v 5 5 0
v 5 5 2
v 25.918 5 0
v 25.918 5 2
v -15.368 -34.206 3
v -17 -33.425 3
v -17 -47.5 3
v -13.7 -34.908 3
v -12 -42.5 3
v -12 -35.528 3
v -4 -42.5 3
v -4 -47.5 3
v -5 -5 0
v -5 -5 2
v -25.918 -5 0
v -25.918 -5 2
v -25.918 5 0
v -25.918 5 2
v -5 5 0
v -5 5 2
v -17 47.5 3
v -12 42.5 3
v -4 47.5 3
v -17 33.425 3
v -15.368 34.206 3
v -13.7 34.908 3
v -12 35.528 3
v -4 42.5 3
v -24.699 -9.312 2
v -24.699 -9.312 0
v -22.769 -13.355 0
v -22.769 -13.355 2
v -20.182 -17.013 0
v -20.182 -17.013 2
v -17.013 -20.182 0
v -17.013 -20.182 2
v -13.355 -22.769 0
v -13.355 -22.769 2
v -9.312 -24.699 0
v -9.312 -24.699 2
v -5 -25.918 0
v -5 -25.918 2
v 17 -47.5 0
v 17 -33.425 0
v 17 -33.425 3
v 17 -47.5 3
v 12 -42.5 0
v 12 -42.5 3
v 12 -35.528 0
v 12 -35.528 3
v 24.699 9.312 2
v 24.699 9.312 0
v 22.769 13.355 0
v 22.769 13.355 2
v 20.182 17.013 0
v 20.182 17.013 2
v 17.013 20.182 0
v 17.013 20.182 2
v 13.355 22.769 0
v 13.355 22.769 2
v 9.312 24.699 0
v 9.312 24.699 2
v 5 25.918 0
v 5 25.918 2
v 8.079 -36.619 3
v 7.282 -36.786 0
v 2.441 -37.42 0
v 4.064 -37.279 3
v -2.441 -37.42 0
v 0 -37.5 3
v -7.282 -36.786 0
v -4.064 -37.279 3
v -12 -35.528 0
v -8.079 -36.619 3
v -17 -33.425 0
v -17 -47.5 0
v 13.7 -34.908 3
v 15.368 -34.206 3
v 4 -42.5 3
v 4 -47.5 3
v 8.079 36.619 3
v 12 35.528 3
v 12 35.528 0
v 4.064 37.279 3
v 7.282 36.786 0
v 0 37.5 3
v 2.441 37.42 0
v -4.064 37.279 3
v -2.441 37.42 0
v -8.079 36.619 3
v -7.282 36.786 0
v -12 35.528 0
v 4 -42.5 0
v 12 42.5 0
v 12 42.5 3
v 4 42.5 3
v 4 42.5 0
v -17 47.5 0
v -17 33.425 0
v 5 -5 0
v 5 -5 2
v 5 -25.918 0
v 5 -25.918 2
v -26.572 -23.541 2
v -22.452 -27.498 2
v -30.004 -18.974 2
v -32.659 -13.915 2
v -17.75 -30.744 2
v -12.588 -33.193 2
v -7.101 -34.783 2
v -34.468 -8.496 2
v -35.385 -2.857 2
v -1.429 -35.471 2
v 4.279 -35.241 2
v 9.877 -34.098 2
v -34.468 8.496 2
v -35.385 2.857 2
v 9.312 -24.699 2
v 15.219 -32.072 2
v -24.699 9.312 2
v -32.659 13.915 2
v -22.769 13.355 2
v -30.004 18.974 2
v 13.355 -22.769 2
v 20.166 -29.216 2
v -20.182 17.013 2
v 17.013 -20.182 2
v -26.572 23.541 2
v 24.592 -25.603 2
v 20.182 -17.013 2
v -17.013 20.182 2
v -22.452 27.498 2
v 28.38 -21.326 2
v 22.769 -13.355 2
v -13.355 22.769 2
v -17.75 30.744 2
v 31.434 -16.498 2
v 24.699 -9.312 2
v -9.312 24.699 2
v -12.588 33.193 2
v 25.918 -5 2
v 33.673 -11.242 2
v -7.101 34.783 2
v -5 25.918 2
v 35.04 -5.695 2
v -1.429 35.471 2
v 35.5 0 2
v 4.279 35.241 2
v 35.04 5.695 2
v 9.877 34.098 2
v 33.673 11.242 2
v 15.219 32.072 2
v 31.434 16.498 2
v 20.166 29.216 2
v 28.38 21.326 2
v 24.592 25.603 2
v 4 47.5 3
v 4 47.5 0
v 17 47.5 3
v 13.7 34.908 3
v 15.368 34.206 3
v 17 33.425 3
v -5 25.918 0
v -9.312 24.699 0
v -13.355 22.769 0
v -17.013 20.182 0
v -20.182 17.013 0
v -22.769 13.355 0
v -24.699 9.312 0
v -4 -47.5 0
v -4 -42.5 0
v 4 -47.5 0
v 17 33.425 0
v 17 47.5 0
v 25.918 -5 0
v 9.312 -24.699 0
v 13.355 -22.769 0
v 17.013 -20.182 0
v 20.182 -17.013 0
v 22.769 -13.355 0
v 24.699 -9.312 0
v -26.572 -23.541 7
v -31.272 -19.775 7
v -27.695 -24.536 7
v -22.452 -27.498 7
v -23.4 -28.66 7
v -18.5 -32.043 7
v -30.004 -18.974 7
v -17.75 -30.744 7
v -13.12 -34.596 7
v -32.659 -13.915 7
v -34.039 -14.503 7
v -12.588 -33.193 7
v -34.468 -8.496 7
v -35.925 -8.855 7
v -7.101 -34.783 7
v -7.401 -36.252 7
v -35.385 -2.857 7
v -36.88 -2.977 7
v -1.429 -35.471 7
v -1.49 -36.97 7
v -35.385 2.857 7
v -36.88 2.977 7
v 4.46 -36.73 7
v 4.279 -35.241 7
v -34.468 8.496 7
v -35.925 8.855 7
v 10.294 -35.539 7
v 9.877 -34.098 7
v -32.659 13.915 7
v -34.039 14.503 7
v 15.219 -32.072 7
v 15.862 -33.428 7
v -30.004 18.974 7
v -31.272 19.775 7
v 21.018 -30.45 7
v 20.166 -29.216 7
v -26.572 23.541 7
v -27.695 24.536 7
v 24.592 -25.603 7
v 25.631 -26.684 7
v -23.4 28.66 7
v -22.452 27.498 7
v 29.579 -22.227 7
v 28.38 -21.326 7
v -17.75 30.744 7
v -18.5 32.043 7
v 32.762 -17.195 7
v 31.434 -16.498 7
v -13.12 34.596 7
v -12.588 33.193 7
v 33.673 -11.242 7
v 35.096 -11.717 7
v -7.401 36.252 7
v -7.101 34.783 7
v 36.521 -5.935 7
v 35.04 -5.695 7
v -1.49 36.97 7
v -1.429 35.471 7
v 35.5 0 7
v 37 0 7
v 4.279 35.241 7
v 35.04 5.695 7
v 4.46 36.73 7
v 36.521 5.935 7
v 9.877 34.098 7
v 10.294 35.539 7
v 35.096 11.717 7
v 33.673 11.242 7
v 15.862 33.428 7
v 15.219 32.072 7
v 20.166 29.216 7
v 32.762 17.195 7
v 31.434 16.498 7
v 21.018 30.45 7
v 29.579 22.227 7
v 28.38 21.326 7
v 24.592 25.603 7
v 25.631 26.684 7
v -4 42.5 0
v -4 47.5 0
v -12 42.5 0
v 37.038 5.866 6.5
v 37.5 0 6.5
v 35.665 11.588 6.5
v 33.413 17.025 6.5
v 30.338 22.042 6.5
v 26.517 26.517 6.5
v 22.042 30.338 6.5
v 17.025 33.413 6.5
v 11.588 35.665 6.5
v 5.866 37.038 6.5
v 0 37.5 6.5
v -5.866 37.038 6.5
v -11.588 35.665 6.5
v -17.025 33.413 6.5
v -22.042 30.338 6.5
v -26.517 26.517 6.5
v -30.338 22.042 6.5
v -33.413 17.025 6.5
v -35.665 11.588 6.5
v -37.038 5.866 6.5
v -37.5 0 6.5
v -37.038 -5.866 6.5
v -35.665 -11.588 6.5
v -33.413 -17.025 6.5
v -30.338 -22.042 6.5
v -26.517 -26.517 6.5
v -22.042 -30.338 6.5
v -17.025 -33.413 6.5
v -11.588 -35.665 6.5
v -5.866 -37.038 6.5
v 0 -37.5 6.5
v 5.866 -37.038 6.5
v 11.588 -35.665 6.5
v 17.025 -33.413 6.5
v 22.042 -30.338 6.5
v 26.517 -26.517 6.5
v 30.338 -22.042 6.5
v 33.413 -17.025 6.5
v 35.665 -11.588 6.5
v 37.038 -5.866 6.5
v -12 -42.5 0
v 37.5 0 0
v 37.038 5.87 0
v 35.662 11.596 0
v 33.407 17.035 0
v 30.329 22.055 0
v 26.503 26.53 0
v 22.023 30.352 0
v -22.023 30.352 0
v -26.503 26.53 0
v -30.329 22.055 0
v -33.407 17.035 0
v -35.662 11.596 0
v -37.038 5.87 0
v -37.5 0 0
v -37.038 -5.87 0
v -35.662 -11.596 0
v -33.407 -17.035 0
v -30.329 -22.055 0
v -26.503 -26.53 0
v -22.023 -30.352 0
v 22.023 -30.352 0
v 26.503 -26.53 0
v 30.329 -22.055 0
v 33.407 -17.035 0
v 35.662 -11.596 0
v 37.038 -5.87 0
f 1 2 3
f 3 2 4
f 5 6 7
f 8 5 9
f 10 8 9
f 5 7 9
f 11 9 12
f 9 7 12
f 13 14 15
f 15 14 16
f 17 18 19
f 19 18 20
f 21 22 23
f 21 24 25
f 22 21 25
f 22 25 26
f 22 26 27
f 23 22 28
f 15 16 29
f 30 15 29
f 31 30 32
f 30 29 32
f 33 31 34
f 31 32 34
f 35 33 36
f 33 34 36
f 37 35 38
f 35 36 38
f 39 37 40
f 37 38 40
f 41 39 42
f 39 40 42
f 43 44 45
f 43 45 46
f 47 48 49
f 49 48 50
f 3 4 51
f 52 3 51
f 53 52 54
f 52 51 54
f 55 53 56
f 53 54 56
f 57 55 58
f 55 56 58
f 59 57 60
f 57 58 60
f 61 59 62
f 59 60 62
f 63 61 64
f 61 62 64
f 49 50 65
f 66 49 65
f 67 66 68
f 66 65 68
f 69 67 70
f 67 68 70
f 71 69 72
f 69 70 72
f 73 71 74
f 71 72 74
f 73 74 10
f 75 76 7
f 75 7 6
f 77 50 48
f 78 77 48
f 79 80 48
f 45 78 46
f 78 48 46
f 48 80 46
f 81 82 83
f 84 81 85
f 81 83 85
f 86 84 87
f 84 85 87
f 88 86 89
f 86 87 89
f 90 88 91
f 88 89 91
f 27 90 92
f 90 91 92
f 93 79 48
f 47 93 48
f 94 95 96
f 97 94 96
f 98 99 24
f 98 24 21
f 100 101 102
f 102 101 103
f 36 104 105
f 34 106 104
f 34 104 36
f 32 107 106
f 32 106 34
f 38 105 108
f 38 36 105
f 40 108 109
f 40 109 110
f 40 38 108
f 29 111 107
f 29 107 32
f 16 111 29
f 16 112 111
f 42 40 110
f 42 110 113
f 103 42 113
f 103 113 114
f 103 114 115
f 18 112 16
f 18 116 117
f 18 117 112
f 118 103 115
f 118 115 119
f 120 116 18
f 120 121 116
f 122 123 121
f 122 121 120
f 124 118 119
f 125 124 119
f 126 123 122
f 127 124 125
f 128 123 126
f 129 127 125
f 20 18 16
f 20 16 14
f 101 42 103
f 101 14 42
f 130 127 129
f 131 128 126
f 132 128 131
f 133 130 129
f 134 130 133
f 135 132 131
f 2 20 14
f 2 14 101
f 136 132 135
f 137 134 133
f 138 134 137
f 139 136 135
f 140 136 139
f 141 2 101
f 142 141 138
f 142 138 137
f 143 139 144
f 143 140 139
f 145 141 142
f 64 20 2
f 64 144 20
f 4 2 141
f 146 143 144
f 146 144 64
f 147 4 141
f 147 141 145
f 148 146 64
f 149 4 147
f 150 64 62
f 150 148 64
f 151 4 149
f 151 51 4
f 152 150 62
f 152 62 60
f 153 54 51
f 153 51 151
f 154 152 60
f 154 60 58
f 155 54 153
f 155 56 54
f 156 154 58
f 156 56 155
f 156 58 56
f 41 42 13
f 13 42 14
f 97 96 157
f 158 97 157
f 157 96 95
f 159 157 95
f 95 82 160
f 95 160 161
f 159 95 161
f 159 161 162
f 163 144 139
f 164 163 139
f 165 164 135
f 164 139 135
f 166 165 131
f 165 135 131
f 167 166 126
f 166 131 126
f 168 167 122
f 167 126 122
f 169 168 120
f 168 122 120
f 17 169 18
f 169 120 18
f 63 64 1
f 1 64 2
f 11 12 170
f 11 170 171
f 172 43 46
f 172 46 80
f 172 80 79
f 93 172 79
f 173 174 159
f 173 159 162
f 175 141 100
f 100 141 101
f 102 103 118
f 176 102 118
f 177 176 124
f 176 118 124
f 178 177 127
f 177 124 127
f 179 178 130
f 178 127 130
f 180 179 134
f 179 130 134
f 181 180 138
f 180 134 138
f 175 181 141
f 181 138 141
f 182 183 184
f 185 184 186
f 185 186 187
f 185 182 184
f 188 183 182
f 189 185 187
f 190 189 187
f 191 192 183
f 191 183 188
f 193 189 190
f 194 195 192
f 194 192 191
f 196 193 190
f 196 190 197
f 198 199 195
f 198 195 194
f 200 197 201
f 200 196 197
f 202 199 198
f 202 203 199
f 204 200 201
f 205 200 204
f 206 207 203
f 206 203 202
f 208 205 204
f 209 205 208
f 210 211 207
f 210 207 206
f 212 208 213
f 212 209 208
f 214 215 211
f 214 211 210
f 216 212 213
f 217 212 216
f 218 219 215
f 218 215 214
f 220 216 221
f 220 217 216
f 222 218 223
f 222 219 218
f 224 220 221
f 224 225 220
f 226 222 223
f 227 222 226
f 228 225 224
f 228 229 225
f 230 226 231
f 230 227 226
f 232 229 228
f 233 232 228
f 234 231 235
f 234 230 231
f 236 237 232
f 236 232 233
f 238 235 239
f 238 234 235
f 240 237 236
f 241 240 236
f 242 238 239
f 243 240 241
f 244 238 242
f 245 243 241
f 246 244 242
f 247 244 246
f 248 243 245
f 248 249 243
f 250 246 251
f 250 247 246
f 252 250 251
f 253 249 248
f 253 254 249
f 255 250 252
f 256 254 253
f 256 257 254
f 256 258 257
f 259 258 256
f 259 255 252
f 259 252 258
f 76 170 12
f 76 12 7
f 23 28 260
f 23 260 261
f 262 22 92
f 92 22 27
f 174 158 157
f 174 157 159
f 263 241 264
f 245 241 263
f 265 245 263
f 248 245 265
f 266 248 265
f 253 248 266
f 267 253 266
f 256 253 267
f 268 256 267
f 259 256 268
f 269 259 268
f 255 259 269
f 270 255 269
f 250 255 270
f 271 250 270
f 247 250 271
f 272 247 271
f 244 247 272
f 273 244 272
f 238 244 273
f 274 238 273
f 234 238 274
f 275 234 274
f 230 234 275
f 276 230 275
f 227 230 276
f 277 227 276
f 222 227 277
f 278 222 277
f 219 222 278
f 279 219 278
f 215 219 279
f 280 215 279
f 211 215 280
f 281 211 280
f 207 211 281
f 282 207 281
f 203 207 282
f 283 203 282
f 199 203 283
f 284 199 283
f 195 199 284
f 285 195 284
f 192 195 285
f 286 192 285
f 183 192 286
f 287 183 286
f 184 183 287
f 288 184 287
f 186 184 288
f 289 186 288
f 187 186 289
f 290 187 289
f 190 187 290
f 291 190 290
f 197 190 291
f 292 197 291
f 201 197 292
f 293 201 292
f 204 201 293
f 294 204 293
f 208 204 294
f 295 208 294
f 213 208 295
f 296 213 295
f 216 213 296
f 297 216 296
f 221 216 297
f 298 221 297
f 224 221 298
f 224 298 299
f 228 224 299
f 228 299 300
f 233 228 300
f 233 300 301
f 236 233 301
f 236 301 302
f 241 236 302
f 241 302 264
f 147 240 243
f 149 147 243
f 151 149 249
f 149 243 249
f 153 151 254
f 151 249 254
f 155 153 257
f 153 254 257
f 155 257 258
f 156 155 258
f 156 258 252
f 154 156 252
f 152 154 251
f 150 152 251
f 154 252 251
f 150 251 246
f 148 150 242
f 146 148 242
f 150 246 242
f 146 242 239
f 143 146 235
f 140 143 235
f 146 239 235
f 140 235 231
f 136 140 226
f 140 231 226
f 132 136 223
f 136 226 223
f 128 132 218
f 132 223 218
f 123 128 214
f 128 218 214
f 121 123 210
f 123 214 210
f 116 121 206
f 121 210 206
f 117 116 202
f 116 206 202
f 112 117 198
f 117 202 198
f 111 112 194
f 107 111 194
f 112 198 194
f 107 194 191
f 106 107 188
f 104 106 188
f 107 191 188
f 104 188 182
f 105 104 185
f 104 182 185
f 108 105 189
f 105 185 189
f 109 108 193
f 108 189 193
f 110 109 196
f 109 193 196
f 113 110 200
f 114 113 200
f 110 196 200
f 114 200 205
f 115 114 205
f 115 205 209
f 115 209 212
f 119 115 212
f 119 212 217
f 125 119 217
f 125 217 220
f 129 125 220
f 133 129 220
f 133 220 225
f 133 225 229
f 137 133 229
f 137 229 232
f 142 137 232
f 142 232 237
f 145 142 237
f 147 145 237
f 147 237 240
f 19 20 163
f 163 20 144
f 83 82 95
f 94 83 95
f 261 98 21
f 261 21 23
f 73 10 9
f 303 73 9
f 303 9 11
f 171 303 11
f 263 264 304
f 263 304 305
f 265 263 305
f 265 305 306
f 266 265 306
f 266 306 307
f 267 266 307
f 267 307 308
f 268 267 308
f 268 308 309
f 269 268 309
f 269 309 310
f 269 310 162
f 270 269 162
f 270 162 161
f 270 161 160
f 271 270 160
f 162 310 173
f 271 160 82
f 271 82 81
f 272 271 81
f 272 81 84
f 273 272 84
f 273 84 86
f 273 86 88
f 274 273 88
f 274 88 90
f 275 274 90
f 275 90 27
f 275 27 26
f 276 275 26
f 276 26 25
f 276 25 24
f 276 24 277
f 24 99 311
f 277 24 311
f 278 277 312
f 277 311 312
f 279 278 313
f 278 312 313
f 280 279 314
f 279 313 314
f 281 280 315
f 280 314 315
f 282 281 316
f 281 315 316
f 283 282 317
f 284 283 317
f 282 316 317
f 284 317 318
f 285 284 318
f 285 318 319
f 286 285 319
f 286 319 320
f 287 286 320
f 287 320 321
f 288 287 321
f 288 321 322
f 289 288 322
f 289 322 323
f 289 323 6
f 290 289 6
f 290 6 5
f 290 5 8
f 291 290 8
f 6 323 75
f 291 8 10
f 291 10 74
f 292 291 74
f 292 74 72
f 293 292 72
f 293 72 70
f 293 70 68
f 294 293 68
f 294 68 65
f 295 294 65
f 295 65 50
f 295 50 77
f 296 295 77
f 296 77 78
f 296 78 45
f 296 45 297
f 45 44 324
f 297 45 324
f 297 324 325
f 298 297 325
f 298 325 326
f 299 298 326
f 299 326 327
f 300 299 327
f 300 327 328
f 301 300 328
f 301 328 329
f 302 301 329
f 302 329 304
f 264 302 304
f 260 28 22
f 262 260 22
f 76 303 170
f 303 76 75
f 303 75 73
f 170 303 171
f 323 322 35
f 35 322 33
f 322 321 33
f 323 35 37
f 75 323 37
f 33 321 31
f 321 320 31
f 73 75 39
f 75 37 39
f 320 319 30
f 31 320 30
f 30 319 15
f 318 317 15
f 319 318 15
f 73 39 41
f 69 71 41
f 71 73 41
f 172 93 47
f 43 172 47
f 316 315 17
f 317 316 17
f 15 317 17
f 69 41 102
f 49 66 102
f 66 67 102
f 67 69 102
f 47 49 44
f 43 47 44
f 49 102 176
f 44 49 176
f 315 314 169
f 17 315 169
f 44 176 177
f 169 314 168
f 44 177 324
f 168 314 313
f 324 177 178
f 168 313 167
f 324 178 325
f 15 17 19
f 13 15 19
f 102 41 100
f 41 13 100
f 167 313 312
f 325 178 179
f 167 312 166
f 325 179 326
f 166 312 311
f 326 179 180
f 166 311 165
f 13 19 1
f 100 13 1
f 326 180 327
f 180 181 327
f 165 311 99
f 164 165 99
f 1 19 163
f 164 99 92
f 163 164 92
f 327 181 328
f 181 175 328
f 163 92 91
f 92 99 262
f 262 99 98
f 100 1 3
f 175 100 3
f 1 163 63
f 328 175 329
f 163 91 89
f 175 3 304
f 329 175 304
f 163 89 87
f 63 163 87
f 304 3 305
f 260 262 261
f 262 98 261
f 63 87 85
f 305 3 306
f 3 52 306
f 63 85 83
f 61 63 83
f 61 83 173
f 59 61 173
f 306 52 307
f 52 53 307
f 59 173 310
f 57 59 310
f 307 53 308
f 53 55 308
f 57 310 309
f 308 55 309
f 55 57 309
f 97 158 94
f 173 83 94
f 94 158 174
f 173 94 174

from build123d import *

# Parameters (mm, degrees)
F0_R      = 37.5
F1_DEPTH  = 7
F2_R      = 35.5
F3_DEPTH  = 5
F4_SIZE   = 0.5
F6_DEPTH  = 3
F7_W      = 4
F7_H      = 5
F8_DEPTH  = 3
F9_W      = 4
F9_H      = 5
F10_DEPTH = 3
F12_DEPTH = 2


with BuildPart() as f1:
    # F0 (on Top) → F1 (new body)
    with BuildSketch(Plane.XY):
        Circle(F0_R)
    extrude(amount=F1_DEPTH)

    # F2 (on face) → F3 (cut)
    with BuildSketch(Plane.XY.offset(7)):
        Circle(F2_R)
    extrude(amount=-F3_DEPTH, mode=Mode.SUBTRACT)

    # F4
    f4_edges = [f1.edges().sort_by_distance(p)[0] for p in [
        (-37.5, 0, 7),
    ]]
    chamfer(f4_edges, length=F4_SIZE)

    # F5 (on face) → F6 (join)
    with BuildSketch(Plane(origin=(0, 0, 0), x_dir=(1, 0, 0), z_dir=(0, 0, -1))):
        with BuildLine():
            ThreePointArc((-17, 33.4252898267), (-8.740756017, 36.467097283), (0, 37.5))
            Line((0, 37.5), (0, 47.5))
            Line((0, 47.5), (-17, 47.5))
            Line((-17, 47.5), (-17, 33.4252898267))
        make_face()
        with BuildLine():
            Line((0, 47.5), (0, 37.5))
            ThreePointArc((0, 37.5), (8.740756017, 36.467097283), (17, 33.4252898267))
            Line((17, 33.4252898267), (17, 47.5))
            Line((17, 47.5), (0, 47.5))
        make_face()
        with BuildLine():
            Line((0, -47.5), (0, -37.5))
            ThreePointArc((0, -37.5), (-8.740756017, -36.467097283), (-17, -33.4252898267))
            Line((-17, -33.4252898267), (-17, -47.5))
            Line((-17, -47.5), (0, -47.5))
        make_face()
        with BuildLine():
            ThreePointArc((17, -33.4252898267), (8.740756017, -36.467097283), (0, -37.5))
            Line((0, -37.5), (0, -47.5))
            Line((0, -47.5), (17, -47.5))
            Line((17, -47.5), (17, -33.4252898267))
        make_face()
    extrude(amount=-F6_DEPTH)

    # F7 (on face) → F8 (cut, through all)
    with BuildSketch(Plane.XY.offset(3)):
        with BuildLine():
            Line((4, 42.5), (0, 42.5))
            Line((0, 42.5), (-4, 42.5))
            Line((-4, 42.5), (-12, 42.5))
            Line((-12, 42.5), (-12, 35.528157847))
            ThreePointArc((-12, 35.528157847), (0, 37.5), (12, 35.528157847))
            Line((12, 35.528157847), (12, 42.5))
            Line((12, 42.5), (4, 42.5))
        make_face()
        with Locations((2, 45)):
            Rectangle(F7_W, F7_H)
        with Locations((-2, 45)):
            Rectangle(F7_W, F7_H)
    extrude(amount=-F8_DEPTH, mode=Mode.SUBTRACT)

    # F9 (on face) → F10 (cut, through all)
    with BuildSketch(Plane.XY.offset(3)):
        with BuildLine():
            Line((-4, -42.5), (0, -42.5))
            Line((0, -42.5), (4, -42.5))
            Line((4, -42.5), (12, -42.5))
            Line((12, -42.5), (12, -35.528157847))
            ThreePointArc((12, -35.528157847), (0, -37.5), (-12, -35.528157847))
            Line((-12, -35.528157847), (-12, -42.5))
            Line((-12, -42.5), (-4, -42.5))
        make_face()
        with Locations((2, -45)):
            Rectangle(F9_W, F9_H)
        with Locations((-2, -45)):
            Rectangle(F9_W, F9_H)
    extrude(amount=-F10_DEPTH, mode=Mode.SUBTRACT)

    # F11 (on face) → F12 (cut, through all)
    with BuildSketch(Plane.XY.offset(2)):
        with BuildLine():
            Line((5, 5), (25.9183331907, 5))
            ThreePointArc((25.9183331907, 5), (18.6649403345, 18.6649403345), (5, 25.9183331907))
            Line((5, 25.9183331907), (5, 5))
        make_face()
        with BuildLine():
            Line((-5, 5), (-5, 25.9183331907))
            ThreePointArc((-5, 25.9183331907), (-18.6649403345, 18.6649403345), (-25.9183331907, 5))
            Line((-25.9183331907, 5), (-5, 5))
        make_face()
        with BuildLine():
            ThreePointArc((5, -25.9183331907), (18.6649403345, -18.6649403345), (25.9183331907, -5))
            Line((25.9183331907, -5), (5, -5))
            Line((5, -5), (5, -25.9183331907))
        make_face()
        with BuildLine():
            ThreePointArc((-25.9183331907, -5), (-18.6649403345, -18.6649403345), (-5, -25.9183331907))
            Line((-5, -25.9183331907), (-5, -5))
            Line((-5, -5), (-25.9183331907, -5))
        make_face()
    extrude(amount=-F12_DEPTH, mode=Mode.SUBTRACT)


solid = f1.part
